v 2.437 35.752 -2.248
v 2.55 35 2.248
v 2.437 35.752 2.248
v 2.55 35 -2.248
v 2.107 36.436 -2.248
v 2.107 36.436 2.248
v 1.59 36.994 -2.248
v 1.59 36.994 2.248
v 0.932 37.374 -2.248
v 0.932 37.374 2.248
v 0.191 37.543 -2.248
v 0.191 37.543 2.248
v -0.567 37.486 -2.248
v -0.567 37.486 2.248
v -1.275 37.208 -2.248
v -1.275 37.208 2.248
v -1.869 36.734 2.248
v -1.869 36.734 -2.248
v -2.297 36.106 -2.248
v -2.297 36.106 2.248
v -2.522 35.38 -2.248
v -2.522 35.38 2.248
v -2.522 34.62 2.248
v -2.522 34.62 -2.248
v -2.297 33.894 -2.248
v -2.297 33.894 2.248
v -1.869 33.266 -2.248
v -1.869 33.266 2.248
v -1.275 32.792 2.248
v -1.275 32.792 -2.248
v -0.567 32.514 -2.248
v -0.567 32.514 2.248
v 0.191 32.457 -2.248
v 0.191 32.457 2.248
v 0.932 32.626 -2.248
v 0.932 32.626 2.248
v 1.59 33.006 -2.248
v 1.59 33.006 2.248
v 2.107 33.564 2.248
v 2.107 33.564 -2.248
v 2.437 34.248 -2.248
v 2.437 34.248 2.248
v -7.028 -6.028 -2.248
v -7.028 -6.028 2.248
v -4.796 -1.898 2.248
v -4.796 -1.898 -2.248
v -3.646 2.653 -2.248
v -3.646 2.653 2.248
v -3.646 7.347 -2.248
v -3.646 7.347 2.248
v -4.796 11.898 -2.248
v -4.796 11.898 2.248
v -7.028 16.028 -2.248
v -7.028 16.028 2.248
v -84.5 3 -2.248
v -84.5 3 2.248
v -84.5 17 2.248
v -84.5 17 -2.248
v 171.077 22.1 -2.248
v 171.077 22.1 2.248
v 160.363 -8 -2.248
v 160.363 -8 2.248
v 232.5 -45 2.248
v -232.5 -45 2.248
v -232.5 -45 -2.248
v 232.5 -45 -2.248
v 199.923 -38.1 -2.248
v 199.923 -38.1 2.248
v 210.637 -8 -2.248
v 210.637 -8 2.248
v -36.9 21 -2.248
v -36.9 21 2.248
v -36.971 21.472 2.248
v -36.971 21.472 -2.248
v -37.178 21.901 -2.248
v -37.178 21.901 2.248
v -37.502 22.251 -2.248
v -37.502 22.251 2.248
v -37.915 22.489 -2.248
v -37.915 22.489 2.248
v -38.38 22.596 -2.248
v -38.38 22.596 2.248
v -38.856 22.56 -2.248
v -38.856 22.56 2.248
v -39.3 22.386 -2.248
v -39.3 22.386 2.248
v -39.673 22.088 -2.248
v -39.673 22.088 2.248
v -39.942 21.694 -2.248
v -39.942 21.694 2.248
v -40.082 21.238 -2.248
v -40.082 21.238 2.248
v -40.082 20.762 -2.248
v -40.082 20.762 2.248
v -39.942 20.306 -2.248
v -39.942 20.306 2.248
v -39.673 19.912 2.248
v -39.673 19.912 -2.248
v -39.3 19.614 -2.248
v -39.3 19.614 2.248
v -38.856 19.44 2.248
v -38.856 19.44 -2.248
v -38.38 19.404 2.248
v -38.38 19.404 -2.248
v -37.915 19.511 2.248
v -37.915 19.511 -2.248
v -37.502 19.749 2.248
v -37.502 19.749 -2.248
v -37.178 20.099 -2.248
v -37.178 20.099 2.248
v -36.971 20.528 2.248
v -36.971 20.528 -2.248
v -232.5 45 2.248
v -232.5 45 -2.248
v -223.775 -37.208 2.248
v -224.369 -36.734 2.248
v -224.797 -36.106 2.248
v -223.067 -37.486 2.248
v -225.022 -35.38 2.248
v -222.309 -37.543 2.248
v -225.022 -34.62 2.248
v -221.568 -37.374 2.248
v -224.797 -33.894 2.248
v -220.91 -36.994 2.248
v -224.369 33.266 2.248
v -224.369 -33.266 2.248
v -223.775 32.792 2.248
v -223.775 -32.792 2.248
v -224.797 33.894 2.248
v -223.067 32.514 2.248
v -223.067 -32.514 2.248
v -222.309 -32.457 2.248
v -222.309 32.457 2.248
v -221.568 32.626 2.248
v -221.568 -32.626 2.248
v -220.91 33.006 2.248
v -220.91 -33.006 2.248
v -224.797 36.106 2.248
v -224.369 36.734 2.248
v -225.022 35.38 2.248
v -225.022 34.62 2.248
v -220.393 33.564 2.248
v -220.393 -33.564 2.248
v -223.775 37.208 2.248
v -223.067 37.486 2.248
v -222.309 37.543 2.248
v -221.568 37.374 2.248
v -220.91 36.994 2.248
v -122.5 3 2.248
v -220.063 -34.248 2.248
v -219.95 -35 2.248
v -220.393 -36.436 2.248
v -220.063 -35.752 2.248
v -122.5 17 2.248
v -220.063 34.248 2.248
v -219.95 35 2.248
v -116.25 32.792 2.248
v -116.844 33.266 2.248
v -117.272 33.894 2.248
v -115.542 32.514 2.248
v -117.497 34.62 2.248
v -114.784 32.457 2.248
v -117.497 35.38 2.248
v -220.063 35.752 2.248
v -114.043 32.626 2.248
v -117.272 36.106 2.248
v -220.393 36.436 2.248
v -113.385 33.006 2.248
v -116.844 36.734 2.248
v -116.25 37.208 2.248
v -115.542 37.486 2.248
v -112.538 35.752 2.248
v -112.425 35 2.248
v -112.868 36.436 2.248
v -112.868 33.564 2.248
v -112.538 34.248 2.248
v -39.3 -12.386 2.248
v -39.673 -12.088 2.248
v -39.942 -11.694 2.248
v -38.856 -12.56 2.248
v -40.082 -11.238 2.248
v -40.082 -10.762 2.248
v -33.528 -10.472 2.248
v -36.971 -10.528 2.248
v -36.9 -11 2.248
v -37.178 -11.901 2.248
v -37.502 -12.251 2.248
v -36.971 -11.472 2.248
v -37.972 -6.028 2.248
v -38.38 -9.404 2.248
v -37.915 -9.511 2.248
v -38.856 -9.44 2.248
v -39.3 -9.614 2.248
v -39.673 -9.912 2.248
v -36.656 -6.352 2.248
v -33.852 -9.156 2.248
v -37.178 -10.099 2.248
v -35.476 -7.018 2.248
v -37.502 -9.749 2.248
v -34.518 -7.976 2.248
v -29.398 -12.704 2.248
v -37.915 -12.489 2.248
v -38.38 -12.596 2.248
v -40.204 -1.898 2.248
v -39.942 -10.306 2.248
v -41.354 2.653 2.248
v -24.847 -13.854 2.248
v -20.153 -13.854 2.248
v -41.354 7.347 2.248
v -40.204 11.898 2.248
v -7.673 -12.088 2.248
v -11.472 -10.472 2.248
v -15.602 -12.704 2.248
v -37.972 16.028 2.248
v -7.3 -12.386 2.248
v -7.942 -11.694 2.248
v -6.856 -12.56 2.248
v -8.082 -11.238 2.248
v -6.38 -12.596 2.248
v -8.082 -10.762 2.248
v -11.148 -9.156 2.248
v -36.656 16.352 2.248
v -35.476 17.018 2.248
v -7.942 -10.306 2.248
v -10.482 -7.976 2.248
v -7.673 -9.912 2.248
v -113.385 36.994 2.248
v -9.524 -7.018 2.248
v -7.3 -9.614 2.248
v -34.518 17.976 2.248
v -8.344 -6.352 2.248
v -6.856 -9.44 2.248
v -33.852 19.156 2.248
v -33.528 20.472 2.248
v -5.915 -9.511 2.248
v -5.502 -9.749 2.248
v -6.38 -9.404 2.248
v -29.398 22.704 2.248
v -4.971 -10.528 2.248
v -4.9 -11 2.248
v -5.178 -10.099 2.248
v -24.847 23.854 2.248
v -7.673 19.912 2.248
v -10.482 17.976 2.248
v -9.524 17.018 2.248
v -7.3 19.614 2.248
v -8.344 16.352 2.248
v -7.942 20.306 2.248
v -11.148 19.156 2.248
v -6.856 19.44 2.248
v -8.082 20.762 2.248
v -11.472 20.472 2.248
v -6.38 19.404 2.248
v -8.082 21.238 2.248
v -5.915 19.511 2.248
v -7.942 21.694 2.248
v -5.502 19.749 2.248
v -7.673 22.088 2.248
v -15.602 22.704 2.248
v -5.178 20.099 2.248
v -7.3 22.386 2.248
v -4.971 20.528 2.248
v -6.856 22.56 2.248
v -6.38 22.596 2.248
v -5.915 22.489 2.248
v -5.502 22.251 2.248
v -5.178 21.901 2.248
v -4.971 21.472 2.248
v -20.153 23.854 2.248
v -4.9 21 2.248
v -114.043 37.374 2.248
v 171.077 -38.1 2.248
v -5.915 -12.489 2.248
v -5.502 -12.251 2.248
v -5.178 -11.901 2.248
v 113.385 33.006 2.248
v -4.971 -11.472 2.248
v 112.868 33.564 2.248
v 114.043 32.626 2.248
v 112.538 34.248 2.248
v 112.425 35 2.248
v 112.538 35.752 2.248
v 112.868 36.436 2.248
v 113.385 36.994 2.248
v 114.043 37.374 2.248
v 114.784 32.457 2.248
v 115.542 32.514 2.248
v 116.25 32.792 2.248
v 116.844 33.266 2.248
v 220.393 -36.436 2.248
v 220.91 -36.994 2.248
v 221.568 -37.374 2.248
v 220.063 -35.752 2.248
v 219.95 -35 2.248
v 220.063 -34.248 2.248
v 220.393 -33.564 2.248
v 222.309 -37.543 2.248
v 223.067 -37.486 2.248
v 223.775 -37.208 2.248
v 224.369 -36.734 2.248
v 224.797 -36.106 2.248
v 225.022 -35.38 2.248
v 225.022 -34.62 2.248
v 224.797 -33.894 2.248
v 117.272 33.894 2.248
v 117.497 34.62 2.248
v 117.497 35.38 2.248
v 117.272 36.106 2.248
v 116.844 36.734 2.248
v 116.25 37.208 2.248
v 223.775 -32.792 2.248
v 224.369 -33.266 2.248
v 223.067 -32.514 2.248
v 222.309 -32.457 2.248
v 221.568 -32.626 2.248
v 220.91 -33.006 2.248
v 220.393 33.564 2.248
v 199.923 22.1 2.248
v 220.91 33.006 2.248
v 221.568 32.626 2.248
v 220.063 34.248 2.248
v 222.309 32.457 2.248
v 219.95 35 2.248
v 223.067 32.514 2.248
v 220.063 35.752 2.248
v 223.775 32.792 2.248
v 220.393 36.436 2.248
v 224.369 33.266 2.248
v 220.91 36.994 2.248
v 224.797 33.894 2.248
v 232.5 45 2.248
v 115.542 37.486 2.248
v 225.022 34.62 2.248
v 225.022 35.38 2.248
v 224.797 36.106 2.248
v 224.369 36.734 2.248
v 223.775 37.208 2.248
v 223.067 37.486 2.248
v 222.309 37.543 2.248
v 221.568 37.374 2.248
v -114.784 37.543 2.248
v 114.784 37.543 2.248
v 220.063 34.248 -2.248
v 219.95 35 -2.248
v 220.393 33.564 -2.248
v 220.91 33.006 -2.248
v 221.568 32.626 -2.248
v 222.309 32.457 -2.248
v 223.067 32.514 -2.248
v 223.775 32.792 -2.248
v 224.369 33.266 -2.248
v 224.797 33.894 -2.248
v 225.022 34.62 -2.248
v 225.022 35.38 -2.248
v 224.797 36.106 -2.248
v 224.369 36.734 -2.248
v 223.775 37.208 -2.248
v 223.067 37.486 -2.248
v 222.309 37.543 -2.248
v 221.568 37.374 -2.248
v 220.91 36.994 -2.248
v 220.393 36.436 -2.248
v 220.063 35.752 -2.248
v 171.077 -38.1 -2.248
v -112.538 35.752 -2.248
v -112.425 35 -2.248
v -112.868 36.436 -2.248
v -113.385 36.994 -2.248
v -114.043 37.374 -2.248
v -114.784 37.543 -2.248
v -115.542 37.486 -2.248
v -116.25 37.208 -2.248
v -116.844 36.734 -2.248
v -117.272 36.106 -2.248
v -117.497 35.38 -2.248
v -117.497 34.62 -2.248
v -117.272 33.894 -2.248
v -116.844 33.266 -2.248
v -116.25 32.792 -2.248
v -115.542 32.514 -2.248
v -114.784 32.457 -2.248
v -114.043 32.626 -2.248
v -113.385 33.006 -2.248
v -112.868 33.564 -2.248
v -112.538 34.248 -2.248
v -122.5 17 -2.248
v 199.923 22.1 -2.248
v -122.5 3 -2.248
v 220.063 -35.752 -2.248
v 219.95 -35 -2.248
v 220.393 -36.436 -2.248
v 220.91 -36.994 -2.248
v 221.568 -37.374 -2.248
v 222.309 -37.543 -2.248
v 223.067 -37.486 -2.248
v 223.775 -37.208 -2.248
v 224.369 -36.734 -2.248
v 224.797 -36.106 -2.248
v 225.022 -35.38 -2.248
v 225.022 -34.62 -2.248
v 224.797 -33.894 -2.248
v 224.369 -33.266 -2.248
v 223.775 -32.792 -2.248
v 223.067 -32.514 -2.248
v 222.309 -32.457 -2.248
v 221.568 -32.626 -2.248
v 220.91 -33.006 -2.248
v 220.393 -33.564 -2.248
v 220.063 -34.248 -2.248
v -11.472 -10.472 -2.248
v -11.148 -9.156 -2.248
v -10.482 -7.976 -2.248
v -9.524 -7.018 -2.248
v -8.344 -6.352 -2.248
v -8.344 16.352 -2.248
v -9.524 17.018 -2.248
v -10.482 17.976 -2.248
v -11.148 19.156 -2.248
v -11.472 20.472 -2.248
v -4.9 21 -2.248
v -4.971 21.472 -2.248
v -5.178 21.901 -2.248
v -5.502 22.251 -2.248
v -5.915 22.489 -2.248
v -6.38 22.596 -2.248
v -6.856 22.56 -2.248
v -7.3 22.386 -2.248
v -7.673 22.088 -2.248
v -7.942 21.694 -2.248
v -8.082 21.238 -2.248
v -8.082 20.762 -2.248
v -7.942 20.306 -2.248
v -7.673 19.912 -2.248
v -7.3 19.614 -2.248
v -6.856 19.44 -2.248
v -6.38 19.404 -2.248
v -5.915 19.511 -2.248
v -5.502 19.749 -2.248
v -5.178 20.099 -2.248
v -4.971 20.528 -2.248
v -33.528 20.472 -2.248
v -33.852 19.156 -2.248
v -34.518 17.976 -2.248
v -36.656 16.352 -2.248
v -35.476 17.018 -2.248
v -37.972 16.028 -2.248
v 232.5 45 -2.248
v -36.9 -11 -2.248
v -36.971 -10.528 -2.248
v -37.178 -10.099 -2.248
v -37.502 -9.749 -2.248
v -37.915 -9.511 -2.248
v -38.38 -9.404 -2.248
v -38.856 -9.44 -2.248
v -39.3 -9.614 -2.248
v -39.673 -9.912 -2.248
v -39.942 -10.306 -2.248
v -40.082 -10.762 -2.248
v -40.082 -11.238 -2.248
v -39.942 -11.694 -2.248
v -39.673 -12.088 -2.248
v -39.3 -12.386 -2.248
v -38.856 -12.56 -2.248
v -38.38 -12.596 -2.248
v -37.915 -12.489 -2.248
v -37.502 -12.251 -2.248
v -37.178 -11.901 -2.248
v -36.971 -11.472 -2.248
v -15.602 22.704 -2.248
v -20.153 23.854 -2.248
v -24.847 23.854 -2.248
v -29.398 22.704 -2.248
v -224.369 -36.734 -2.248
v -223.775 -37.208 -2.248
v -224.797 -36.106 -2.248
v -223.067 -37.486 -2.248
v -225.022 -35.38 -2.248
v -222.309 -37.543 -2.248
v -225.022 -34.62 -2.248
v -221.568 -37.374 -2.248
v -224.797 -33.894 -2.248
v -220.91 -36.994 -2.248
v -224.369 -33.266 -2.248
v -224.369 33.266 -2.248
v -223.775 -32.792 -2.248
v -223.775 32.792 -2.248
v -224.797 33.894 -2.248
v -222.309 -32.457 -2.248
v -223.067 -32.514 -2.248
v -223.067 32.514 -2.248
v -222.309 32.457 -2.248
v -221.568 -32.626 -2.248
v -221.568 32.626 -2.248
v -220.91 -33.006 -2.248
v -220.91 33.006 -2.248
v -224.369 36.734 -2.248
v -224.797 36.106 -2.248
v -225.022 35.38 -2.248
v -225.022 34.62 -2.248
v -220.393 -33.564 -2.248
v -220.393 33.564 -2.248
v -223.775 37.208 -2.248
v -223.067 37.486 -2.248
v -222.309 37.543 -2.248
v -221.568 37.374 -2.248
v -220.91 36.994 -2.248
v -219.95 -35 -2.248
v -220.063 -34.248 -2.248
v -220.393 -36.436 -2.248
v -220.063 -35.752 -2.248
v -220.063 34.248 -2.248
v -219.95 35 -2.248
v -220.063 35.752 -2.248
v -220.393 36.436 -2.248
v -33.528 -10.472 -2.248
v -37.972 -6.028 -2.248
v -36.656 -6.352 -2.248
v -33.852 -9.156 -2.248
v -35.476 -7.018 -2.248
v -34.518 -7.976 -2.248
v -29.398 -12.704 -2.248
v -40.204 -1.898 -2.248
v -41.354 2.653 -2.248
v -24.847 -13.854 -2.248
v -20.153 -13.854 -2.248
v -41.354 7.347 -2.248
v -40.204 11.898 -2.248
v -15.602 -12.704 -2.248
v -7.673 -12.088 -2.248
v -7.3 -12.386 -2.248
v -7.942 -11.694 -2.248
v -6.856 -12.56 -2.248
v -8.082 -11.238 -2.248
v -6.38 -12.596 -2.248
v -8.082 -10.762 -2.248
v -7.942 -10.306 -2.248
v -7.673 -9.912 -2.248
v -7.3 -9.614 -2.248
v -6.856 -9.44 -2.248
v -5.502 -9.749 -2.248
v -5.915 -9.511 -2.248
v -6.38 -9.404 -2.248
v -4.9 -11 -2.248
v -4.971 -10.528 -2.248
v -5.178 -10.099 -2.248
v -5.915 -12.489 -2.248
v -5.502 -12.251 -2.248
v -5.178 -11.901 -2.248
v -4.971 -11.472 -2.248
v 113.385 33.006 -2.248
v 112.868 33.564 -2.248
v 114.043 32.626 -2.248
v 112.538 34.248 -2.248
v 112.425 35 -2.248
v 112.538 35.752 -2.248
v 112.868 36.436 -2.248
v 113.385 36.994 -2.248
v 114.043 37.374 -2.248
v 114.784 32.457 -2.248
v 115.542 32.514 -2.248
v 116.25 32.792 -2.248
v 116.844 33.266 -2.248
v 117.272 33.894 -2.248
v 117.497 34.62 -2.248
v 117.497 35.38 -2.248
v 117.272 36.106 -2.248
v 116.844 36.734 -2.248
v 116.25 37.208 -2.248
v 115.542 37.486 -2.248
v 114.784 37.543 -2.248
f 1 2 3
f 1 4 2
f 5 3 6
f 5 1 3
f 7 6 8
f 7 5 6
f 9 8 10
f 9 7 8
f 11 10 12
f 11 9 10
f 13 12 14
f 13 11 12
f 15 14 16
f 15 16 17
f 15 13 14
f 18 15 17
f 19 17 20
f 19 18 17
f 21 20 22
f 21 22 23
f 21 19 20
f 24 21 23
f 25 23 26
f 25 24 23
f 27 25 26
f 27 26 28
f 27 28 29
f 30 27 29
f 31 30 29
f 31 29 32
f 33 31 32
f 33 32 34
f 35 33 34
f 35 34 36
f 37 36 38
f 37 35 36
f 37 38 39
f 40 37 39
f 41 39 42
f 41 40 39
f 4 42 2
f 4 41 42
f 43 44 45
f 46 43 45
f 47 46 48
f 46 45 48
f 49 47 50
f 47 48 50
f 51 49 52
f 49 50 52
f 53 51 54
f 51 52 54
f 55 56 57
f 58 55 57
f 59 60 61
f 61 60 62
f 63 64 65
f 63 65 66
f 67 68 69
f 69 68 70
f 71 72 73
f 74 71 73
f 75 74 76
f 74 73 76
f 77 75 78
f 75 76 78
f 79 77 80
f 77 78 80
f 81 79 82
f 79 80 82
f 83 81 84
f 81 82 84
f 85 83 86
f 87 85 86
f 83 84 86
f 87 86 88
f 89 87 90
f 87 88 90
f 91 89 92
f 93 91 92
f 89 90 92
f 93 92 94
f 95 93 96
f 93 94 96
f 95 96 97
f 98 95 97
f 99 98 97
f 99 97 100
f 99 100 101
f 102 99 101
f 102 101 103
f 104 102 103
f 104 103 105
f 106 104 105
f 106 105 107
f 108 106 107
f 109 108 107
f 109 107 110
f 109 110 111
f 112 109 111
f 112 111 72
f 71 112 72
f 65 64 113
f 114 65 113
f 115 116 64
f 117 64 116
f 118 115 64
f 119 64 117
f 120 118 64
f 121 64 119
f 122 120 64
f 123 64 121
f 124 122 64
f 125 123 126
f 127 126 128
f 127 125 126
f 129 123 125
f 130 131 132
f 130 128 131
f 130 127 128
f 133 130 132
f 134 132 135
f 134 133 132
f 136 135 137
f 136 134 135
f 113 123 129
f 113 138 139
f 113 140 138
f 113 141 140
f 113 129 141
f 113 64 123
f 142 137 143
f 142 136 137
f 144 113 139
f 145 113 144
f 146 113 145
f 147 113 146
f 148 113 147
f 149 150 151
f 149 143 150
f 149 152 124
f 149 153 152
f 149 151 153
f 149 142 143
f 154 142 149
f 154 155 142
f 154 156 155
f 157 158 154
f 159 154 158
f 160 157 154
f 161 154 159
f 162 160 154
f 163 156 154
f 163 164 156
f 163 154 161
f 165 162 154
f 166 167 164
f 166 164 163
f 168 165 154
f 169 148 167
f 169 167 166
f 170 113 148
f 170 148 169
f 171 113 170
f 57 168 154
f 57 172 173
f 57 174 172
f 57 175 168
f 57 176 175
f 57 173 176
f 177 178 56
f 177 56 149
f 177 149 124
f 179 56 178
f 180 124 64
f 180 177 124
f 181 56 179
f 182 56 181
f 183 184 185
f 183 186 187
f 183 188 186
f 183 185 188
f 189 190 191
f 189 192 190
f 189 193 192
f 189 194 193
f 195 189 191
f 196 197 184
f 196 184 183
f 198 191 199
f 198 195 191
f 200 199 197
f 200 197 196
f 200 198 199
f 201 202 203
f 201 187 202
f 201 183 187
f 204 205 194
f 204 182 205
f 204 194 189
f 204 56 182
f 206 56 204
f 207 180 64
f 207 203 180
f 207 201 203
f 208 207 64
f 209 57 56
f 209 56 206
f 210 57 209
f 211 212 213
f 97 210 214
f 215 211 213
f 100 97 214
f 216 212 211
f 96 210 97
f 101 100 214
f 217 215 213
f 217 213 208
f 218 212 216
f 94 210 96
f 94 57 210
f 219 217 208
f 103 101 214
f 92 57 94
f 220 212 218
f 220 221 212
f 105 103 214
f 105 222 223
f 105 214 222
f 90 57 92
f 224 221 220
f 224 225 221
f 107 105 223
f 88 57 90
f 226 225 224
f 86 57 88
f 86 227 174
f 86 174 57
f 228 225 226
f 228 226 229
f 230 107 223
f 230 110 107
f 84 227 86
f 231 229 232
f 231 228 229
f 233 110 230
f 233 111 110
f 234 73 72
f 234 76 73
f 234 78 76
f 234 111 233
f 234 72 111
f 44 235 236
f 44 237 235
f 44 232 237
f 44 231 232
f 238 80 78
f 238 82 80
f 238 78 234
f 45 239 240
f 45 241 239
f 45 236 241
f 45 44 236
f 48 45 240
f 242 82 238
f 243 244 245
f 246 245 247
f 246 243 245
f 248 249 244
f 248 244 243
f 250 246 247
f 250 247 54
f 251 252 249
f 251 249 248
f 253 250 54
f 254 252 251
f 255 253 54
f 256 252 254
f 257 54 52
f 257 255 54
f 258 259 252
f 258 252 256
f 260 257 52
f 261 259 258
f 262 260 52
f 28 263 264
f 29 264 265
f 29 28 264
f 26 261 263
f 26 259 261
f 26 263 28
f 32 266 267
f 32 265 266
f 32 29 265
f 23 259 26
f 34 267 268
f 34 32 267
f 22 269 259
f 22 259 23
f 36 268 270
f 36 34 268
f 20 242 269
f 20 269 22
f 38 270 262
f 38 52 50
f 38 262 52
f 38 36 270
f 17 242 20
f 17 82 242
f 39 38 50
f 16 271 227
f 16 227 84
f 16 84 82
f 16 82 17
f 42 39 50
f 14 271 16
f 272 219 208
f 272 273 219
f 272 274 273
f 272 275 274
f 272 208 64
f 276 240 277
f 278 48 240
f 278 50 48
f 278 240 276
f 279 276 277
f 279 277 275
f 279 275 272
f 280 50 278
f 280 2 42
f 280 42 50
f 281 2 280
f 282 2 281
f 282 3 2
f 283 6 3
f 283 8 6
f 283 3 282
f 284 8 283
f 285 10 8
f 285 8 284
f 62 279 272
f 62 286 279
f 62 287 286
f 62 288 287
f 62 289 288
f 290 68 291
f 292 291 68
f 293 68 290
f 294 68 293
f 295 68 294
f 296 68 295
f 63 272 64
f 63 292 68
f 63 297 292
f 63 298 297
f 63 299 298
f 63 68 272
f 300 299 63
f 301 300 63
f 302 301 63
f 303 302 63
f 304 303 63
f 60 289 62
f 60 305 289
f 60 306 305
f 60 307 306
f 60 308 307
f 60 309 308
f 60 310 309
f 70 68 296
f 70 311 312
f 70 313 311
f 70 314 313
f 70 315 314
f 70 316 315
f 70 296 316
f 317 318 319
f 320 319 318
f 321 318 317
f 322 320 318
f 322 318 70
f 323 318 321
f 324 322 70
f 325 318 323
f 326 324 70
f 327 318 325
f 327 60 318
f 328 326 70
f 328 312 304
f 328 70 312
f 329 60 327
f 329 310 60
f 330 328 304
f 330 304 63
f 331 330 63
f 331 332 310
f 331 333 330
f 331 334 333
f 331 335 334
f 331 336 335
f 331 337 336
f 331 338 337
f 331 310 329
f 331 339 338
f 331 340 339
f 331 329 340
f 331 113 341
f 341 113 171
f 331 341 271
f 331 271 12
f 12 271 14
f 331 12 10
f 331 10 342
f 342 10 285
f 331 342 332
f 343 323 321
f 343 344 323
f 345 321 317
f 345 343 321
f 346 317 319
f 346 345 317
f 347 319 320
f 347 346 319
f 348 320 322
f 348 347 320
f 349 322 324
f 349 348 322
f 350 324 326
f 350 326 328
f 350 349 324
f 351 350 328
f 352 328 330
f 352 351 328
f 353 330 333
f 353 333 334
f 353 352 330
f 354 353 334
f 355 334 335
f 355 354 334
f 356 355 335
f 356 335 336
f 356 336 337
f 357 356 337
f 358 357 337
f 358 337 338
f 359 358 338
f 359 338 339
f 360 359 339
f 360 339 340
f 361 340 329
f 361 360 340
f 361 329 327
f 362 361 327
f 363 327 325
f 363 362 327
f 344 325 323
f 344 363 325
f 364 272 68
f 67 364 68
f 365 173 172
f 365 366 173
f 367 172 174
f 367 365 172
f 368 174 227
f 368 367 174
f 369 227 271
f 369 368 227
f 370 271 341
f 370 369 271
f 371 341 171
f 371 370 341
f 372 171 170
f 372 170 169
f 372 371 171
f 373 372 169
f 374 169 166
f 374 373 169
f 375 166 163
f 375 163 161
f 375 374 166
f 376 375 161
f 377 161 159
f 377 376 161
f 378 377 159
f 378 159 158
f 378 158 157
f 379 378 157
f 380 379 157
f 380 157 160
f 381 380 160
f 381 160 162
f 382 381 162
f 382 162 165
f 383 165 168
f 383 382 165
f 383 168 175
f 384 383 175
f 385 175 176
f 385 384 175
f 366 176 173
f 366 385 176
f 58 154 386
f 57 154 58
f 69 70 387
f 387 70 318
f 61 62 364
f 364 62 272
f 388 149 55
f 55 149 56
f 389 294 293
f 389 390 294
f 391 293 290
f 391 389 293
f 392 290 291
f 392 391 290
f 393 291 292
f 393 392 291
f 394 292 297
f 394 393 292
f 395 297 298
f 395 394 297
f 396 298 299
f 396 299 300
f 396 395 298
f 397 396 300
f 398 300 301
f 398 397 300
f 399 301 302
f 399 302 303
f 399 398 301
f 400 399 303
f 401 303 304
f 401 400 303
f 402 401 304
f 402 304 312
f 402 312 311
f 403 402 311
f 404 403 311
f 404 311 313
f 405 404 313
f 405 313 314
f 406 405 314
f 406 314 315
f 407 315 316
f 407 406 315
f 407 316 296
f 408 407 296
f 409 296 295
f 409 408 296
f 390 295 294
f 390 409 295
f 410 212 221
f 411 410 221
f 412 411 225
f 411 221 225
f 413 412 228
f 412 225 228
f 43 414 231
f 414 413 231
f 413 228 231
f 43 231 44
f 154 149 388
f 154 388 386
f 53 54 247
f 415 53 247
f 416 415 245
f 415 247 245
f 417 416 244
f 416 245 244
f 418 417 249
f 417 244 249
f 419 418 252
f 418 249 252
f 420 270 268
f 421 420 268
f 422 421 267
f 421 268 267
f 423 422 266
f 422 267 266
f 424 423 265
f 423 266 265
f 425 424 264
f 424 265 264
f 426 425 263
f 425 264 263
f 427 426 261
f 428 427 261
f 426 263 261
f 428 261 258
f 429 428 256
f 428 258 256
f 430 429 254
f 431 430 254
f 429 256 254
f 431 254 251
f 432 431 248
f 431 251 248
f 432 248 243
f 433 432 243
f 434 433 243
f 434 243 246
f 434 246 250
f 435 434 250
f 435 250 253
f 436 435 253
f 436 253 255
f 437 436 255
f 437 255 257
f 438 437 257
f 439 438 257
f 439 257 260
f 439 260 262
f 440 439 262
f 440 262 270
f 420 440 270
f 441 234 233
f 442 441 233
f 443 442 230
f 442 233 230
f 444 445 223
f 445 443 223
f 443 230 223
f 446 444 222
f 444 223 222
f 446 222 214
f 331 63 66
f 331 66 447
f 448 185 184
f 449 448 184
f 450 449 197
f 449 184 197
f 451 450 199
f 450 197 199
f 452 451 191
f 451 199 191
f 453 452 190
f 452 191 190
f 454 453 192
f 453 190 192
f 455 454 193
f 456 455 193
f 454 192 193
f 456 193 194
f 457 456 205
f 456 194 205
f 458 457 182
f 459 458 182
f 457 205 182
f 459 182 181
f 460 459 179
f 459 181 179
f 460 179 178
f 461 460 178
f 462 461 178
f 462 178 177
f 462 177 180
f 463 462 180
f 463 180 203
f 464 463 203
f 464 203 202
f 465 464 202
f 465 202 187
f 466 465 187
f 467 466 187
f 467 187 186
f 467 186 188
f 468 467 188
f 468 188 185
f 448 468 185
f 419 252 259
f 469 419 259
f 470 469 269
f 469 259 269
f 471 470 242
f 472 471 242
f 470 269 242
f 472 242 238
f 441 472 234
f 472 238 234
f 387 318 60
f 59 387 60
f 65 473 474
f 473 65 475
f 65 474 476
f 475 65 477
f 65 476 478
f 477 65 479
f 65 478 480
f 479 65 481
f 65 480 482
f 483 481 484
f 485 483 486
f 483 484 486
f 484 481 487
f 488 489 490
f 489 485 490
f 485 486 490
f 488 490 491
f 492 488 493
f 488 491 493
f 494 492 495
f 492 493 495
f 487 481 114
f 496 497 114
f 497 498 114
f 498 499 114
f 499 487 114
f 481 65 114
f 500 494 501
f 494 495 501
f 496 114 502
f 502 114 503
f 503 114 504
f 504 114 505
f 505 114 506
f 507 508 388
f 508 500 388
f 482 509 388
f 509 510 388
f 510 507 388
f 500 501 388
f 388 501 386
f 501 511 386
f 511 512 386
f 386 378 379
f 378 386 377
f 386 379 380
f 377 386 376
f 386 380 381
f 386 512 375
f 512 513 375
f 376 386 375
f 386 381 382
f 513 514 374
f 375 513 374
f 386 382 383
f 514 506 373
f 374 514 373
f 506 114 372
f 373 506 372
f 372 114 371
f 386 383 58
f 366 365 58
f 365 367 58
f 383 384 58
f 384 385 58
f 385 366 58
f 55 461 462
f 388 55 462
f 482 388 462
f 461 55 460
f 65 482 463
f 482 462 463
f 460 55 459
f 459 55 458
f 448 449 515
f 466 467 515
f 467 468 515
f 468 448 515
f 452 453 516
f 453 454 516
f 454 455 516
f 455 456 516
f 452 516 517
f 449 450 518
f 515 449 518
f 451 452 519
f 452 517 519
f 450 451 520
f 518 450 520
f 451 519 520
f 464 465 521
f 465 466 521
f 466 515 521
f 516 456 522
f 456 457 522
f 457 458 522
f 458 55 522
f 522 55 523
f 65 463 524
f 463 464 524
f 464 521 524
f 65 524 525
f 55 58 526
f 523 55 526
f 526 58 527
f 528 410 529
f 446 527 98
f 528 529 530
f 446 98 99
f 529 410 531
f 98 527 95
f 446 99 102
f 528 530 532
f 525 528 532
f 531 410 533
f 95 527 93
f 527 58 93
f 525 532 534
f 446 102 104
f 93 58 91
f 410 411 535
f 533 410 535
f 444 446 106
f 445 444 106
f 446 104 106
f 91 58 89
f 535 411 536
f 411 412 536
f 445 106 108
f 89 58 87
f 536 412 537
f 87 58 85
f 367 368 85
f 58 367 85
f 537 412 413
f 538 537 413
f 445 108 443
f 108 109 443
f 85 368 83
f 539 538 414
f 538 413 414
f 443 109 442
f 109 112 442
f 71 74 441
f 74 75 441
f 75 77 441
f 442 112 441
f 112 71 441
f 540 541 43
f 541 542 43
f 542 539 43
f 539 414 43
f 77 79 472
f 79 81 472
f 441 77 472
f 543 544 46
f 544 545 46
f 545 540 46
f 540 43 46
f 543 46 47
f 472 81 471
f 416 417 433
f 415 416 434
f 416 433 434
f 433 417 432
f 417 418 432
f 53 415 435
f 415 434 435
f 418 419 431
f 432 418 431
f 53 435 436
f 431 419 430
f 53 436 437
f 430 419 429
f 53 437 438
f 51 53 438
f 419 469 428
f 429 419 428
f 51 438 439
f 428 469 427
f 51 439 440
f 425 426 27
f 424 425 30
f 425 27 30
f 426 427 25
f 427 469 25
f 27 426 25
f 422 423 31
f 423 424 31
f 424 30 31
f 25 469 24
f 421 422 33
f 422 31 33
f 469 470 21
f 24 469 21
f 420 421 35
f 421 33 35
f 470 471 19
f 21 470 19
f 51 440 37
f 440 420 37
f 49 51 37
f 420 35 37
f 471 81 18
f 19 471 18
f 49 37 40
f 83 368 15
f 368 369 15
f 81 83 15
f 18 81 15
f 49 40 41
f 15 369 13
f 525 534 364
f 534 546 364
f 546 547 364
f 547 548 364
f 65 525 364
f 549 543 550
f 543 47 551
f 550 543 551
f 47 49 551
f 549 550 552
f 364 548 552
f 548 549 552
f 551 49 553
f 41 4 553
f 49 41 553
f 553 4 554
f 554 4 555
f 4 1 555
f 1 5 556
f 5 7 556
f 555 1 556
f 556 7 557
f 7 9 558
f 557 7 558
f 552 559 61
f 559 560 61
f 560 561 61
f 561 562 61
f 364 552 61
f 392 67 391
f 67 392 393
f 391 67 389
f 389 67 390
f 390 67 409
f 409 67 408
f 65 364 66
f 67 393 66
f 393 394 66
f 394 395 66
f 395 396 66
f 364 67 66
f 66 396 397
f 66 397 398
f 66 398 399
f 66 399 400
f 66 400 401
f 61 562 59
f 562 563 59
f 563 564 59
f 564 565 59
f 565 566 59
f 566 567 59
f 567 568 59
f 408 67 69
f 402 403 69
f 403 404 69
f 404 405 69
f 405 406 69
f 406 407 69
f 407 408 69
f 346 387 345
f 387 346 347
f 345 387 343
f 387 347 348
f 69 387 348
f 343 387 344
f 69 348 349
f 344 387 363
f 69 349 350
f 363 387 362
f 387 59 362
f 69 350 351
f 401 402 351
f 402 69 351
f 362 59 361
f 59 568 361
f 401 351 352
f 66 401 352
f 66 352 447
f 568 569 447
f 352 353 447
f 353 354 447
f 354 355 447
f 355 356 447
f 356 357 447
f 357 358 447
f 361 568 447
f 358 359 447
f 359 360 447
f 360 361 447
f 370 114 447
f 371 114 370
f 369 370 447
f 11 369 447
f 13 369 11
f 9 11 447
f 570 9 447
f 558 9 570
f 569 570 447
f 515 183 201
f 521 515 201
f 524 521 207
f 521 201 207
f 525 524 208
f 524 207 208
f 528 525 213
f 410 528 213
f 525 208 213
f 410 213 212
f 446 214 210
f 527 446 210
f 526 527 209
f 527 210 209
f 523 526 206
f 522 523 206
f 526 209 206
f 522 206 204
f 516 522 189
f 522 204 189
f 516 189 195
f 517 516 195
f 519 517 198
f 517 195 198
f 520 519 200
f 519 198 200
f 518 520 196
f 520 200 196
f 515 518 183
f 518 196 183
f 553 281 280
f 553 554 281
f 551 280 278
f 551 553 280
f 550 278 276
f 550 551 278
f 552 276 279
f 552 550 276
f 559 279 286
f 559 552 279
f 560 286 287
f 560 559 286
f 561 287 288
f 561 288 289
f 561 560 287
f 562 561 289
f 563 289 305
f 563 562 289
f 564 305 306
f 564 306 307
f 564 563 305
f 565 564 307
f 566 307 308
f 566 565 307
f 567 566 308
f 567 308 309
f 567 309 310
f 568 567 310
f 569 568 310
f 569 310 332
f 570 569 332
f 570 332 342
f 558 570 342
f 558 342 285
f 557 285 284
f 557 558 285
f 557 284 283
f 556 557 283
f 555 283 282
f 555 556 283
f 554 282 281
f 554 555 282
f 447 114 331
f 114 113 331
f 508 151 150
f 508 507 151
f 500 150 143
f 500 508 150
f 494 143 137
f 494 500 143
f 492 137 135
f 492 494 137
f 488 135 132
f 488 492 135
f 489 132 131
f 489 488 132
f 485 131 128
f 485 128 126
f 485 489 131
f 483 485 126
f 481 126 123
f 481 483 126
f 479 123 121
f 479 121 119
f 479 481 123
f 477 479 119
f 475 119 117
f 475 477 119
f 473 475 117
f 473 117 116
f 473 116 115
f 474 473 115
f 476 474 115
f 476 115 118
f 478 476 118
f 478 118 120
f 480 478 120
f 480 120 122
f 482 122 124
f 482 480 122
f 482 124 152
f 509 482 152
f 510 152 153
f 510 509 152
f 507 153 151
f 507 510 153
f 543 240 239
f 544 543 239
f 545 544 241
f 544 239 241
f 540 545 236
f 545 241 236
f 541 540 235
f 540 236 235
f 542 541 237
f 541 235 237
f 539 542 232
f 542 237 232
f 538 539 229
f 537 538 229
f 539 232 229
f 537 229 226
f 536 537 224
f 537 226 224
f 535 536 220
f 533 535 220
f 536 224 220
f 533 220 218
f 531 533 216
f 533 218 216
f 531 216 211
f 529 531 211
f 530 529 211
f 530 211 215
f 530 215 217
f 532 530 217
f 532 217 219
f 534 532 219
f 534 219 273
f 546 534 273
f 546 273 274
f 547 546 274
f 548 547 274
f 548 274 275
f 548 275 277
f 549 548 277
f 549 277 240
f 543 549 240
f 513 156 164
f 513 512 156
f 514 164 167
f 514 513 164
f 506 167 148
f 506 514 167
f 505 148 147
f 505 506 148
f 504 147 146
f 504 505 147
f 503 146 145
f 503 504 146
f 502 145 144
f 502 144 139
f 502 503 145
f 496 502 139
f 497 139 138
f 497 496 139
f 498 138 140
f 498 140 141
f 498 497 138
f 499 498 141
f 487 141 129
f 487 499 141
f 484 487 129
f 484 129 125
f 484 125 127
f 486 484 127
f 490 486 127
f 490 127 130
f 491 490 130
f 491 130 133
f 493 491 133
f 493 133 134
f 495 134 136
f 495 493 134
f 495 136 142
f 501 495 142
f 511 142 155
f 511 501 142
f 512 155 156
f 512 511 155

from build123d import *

# Parameters (mm, degrees)
SKETCH1_W           = 465
SKETCH1_H           = 90
SKETCH1_R           = 2.55
BOSS_EXTRUDE1_DEPTH = 2.2479
CUT_EXTRUDE1_REACH  = 238.857
SKETCH2_R           = 1.6
SKETCH2_W           = 38
SKETCH2_H           = 14


with BuildPart() as part:
    # Sketch1 → Boss-Extrude1 (new, symmetric)
    with BuildSketch(Plane.XY):
        Rectangle(SKETCH1_W, SKETCH1_H)
        with Locations((-222.5, 35)):
            Circle(SKETCH1_R, mode=Mode.SUBTRACT)
        with Locations((-222.5, -35)):
            Circle(SKETCH1_R, mode=Mode.SUBTRACT)
        with Locations((0, 35)):
            Circle(SKETCH1_R, mode=Mode.SUBTRACT)
        with Locations((-114.975, 35)):
            Circle(SKETCH1_R, mode=Mode.SUBTRACT)
        with Locations(Location((222.5, -35, 0), (0, 0, 180))):
            Circle(SKETCH1_R, mode=Mode.SUBTRACT)
        with Locations(Location((222.5, 35, 0), (0, 0, 180))):
            Circle(SKETCH1_R, mode=Mode.SUBTRACT)
        with Locations(Location((114.975, 35, 0), (0, 0, 180))):
            Circle(SKETCH1_R, mode=Mode.SUBTRACT)
    extrude(amount=BOSS_EXTRUDE1_DEPTH, both=True)

    # Sketch2 → Cut-Extrude1 (cut, up to next)
    with BuildSketch(Plane.XY.offset(2.2479), mode=Mode.PRIVATE) as cut_extrude1_sk1:
        with Locations((-6.5, 21)):
            Circle(SKETCH2_R)
    cut_extrude1_tool1 = extrude(cut_extrude1_sk1.sketch, amount=-CUT_EXTRUDE1_REACH, mode=Mode.PRIVATE) & part.part
    # Sketch2 → Cut-Extrude1 (cut, up to next)
    with BuildSketch(Plane.XY.offset(2.2479), mode=Mode.PRIVATE) as cut_extrude1_sk2:
        with Locations((-38.5, 21)):
            Circle(SKETCH2_R)
    cut_extrude1_tool2 = extrude(cut_extrude1_sk2.sketch, amount=-CUT_EXTRUDE1_REACH, mode=Mode.PRIVATE) & part.part
    # Sketch2 → Cut-Extrude1 (cut, up to next)
    with BuildSketch(Plane.XY.offset(2.2479), mode=Mode.PRIVATE) as cut_extrude1_sk3:
        with Locations((-38.5, -11)):
            Circle(SKETCH2_R)
    cut_extrude1_tool3 = extrude(cut_extrude1_sk3.sketch, amount=-CUT_EXTRUDE1_REACH, mode=Mode.PRIVATE) & part.part
    # Sketch2 → Cut-Extrude1 (cut, up to next)
    with BuildSketch(Plane.XY.offset(2.2479), mode=Mode.PRIVATE) as cut_extrude1_sk4:
        with Locations((-6.5, -11)):
            Circle(SKETCH2_R)
    cut_extrude1_tool4 = extrude(cut_extrude1_sk4.sketch, amount=-CUT_EXTRUDE1_REACH, mode=Mode.PRIVATE) & part.part
    # Sketch2 → Cut-Extrude1 (cut, up to next)
    with BuildSketch(Plane.XY.offset(2.2479), mode=Mode.PRIVATE) as cut_extrude1_sk5:
        with Locations((-103.5, 10)):
            Rectangle(SKETCH2_W, SKETCH2_H)
    cut_extrude1_tool5 = extrude(cut_extrude1_sk5.sketch, amount=-CUT_EXTRUDE1_REACH, mode=Mode.PRIVATE) & part.part
    # Sketch2 → Cut-Extrude1 (cut, up to next)
    with BuildSketch(Plane.XY.offset(2.2479), mode=Mode.PRIVATE) as cut_extrude1_sk6:
        Polygon((210.636873287, -8), (199.923313965, 22.1), (171.076686035, 22.1), (160.363126713, -8), (171.076686035, -38.1), (199.923313965, -38.1), align=None)
    cut_extrude1_tool6 = extrude(cut_extrude1_sk6.sketch, amount=-CUT_EXTRUDE1_REACH, mode=Mode.PRIVATE) & part.part
    # Sketch2 → Cut-Extrude1 (cut, up to next)
    with BuildSketch(Plane.XY.offset(2.2479), mode=Mode.PRIVATE) as cut_extrude1_sk7:
        with BuildLine():
            ThreePointArc((-33.527951396, -10.472048604), (-22.5, -14), (-11.472048604, -10.472048604))
            ThreePointArc((-11.472048604, -10.472048604), (-10.035533906, -7.464466094), (-7.027951396, -6.027951396))
            ThreePointArc((-7.027951396, -6.027951396), (-3.5, 5), (-7.027951396, 16.027951396))
            ThreePointArc((-7.027951396, 16.027951396), (-10.035533906, 17.464466094), (-11.472048604, 20.472048604))
            ThreePointArc((-11.472048604, 20.472048604), (-22.5, 24), (-33.527951396, 20.472048604))
            ThreePointArc((-33.527951396, 20.472048604), (-34.964466094, 17.464466094), (-37.972048604, 16.027951396))
            ThreePointArc((-37.972048604, 16.027951396), (-41.5, 5), (-37.972048604, -6.027951396))
            ThreePointArc((-37.972048604, -6.027951396), (-34.964466094, -7.464466094), (-33.527951396, -10.472048604))
        make_face()
    cut_extrude1_tool7 = extrude(cut_extrude1_sk7.sketch, amount=-CUT_EXTRUDE1_REACH, mode=Mode.PRIVATE) & part.part
    add(cut_extrude1_tool1.solids().sort_by_distance((-6.5, 21, 2.2479))[0], mode=Mode.SUBTRACT)
    add(cut_extrude1_tool2.solids().sort_by_distance((-38.5, 21, 2.2479))[0], mode=Mode.SUBTRACT)
    add(cut_extrude1_tool3.solids().sort_by_distance((-38.5, -11, 2.2479))[0], mode=Mode.SUBTRACT)
    add(cut_extrude1_tool4.solids().sort_by_distance((-6.5, -11, 2.2479))[0], mode=Mode.SUBTRACT)
    add(cut_extrude1_tool5.solids().sort_by_distance((-103.5, 10, 2.2479))[0], mode=Mode.SUBTRACT)
    add(cut_extrude1_tool6.solids().sort_by_distance((185.5, -8, 2.2479))[0], mode=Mode.SUBTRACT)
    add(cut_extrude1_tool7.solids().sort_by_distance((-22.5, 5, 2.2479))[0], mode=Mode.SUBTRACT)


solid = part.part
